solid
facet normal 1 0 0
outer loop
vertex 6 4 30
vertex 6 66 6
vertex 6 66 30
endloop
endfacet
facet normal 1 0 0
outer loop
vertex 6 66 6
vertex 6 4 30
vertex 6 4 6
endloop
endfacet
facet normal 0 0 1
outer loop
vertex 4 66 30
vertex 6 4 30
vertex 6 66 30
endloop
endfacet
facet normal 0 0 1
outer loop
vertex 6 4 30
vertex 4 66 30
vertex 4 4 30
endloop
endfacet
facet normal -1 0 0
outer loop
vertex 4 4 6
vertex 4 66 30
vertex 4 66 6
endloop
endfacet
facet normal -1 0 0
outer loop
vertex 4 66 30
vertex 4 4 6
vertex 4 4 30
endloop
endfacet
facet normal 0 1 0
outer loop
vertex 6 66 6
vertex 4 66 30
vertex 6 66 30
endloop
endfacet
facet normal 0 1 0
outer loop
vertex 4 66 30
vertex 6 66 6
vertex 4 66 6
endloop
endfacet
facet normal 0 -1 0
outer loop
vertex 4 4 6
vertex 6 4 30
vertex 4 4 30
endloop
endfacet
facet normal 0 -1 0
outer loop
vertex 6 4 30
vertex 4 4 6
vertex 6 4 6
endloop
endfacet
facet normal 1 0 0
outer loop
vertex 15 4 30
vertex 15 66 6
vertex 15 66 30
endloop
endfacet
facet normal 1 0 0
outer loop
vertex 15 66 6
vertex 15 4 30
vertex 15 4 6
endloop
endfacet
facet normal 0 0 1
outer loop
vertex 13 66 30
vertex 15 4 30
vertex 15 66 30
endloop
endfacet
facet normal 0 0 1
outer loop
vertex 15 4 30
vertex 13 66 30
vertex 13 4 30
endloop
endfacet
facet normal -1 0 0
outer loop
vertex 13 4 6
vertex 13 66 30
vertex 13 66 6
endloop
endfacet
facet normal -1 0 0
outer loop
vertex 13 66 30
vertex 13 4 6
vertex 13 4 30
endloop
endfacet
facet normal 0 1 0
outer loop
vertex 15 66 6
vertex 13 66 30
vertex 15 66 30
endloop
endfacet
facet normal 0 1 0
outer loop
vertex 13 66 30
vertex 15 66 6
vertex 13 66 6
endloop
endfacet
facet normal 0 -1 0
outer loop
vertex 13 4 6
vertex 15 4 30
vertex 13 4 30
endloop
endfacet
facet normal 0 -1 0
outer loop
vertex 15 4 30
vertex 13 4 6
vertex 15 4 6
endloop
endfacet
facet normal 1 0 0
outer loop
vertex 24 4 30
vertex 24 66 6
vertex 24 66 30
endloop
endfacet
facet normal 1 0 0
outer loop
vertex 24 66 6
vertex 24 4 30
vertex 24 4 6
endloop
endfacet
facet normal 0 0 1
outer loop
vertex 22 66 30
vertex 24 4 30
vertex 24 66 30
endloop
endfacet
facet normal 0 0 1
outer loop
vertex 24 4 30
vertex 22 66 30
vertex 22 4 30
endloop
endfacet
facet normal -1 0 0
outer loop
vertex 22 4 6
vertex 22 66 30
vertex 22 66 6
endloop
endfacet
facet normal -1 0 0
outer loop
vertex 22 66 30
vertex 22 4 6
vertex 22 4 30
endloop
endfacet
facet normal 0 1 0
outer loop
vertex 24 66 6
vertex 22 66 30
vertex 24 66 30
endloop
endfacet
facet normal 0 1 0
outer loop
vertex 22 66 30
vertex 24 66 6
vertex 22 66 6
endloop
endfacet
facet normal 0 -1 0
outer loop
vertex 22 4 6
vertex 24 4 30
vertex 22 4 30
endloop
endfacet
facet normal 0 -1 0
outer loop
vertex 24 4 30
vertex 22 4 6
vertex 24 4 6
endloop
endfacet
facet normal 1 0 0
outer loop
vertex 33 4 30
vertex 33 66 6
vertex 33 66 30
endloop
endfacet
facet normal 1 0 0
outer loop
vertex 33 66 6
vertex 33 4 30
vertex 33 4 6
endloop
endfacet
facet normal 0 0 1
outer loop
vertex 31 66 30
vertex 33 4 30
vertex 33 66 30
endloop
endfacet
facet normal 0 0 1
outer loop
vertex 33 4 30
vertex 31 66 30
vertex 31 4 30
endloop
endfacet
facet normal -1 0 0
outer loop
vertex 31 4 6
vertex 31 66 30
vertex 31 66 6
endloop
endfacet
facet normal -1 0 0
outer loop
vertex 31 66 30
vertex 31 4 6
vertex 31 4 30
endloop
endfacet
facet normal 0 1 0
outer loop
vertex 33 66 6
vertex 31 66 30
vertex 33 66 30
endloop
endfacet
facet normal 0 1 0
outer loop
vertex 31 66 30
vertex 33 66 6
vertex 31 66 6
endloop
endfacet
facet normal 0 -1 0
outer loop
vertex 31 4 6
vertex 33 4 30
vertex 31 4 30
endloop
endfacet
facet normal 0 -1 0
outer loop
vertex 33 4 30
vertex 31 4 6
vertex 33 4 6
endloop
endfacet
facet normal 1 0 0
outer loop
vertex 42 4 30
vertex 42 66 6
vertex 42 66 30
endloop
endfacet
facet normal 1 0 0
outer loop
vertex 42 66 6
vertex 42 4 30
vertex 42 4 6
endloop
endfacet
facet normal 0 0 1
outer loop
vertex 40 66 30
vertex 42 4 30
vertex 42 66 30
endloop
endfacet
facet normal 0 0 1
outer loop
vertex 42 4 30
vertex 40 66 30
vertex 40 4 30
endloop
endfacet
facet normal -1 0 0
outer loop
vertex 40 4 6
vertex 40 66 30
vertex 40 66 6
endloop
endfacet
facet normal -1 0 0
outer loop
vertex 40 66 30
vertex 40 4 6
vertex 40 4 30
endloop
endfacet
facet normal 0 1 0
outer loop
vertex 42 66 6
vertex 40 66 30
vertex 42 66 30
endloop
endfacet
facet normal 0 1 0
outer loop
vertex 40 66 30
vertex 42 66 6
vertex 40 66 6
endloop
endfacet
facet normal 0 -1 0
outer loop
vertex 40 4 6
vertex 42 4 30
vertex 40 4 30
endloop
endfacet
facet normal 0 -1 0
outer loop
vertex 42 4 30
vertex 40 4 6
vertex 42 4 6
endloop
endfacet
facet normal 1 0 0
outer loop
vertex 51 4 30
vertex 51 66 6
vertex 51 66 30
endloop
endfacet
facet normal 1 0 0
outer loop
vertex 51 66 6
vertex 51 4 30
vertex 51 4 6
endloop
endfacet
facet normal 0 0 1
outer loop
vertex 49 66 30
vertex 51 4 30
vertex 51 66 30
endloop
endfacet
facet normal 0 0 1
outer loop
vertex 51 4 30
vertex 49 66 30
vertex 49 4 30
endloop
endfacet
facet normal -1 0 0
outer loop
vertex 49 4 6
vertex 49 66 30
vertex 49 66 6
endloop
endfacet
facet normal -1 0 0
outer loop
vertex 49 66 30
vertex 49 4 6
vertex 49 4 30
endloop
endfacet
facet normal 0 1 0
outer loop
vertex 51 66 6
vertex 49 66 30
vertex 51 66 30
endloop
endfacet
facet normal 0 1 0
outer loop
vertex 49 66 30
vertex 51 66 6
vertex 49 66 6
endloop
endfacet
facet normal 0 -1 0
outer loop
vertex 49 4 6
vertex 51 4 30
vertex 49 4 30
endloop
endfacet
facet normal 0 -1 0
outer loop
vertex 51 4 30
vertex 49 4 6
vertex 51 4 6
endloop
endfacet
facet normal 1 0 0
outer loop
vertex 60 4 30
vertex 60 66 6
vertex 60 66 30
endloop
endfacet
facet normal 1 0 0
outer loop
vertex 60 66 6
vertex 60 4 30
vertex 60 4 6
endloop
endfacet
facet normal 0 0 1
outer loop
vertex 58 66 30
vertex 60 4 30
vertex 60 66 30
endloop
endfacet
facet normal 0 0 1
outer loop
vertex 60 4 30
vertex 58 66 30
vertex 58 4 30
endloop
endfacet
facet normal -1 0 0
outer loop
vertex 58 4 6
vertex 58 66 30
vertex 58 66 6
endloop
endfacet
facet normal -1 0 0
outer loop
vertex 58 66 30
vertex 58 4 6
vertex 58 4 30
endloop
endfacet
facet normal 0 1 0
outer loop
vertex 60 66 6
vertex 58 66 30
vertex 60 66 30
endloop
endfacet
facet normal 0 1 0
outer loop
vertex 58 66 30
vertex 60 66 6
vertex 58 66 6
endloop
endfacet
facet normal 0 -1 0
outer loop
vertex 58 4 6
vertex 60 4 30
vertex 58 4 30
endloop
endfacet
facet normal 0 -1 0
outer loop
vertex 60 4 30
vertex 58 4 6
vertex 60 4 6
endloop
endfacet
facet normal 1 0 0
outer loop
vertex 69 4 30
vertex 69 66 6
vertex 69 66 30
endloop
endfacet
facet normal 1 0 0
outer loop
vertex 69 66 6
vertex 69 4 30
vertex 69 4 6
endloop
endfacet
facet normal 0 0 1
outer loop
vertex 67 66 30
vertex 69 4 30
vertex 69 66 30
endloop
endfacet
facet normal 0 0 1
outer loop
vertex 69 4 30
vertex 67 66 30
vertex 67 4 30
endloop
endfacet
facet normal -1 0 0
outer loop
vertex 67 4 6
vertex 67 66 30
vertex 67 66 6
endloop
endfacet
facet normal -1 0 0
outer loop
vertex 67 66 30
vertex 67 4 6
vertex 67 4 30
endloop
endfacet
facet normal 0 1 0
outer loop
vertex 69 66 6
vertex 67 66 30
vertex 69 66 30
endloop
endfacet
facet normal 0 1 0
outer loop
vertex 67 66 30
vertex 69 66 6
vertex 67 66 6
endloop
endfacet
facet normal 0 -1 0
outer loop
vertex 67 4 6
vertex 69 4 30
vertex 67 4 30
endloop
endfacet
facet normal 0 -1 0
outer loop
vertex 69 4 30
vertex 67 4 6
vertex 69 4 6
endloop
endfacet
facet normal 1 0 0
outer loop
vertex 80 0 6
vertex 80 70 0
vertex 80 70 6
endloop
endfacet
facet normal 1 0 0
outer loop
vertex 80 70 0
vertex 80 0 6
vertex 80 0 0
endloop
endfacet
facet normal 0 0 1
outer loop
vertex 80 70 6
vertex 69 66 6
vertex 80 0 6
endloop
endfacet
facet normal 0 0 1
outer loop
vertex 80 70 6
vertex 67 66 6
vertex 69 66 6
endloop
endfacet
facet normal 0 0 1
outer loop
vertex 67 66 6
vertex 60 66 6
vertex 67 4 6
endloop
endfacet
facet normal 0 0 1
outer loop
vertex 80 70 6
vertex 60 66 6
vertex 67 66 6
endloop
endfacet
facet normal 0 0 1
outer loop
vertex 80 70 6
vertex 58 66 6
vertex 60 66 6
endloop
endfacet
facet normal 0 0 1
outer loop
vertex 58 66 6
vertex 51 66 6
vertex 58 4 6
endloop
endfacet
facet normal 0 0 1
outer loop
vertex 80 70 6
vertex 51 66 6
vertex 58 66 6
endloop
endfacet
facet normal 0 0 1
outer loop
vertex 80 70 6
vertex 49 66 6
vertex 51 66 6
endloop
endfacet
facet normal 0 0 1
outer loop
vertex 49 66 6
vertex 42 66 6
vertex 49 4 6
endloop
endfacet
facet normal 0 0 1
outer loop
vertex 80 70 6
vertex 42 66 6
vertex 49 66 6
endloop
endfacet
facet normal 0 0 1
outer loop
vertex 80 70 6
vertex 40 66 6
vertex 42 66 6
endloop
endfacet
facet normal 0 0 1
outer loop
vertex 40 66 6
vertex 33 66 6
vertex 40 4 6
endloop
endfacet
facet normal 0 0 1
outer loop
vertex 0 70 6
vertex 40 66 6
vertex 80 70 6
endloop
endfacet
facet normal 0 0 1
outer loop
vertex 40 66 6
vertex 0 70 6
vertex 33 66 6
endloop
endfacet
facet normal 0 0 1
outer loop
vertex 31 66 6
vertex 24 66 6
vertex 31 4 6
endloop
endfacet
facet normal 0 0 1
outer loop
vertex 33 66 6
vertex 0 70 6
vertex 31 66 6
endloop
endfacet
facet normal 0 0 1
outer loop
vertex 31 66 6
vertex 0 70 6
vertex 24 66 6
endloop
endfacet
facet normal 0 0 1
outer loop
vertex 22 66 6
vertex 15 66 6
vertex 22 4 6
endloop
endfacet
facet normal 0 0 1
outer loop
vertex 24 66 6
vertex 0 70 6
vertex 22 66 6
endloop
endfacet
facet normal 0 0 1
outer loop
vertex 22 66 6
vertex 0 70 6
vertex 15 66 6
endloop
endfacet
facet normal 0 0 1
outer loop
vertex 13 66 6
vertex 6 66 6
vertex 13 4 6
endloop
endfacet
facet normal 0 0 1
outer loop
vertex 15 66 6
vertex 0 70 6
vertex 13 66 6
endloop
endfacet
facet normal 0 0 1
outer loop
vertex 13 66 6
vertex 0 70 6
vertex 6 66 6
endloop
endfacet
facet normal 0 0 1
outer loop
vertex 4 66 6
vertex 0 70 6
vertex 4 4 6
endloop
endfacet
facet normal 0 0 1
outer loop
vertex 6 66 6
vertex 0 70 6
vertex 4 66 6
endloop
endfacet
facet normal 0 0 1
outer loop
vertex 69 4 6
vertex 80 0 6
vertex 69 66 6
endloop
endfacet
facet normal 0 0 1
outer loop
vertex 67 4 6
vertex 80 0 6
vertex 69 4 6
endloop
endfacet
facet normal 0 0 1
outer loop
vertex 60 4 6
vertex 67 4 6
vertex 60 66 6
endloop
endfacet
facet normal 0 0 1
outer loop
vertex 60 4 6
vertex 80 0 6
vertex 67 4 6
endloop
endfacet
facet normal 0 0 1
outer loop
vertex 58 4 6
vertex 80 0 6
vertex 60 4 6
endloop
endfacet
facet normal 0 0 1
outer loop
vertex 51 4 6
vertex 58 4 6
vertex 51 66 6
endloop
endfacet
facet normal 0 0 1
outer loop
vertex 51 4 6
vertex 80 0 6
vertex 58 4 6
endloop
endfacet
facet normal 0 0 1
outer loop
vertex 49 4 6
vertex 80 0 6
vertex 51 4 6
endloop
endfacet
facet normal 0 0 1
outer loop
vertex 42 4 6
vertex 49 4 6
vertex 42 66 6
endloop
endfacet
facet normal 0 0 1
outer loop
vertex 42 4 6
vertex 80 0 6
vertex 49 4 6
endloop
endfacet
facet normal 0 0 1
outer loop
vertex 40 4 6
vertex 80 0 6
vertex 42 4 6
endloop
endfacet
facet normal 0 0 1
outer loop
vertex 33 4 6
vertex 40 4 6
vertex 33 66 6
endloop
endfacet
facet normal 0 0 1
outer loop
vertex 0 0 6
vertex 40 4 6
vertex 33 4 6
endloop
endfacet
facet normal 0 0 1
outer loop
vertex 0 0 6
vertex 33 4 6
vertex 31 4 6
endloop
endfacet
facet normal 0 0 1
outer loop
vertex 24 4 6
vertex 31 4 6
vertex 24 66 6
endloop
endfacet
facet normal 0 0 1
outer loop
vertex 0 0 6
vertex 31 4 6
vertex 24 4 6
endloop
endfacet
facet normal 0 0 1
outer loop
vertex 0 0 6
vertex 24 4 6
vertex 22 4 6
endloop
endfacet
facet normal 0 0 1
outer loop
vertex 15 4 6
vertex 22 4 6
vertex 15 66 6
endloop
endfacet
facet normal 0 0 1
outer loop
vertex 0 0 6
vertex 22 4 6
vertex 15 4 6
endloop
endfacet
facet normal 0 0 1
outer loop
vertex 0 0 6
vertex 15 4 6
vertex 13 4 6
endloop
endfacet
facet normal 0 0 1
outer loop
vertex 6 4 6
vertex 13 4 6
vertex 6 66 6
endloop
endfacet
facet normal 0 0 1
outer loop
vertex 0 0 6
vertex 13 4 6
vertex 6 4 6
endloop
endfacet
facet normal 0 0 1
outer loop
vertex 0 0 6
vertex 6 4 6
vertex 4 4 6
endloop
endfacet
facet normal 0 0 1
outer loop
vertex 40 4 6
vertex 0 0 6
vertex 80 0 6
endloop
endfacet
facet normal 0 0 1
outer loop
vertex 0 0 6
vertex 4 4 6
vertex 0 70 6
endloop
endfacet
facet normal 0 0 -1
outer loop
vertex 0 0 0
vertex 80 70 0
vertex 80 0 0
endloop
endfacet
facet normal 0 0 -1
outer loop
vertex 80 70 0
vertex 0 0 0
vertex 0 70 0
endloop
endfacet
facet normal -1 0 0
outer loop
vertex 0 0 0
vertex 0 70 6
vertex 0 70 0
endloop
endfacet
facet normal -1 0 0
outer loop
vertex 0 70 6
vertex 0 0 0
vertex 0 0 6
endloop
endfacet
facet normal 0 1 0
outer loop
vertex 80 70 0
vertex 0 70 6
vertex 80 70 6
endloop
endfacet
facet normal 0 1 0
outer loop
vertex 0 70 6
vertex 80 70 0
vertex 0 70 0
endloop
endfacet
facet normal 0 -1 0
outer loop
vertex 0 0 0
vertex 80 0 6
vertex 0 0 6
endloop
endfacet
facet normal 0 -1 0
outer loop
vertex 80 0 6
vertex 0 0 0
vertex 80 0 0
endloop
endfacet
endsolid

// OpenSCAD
$fn = 32;

// ----------------------------------------------------------------------
// Heatsink: uniform fin block
// ----------------------------------------------------------------------

// --- parameters (mm) ---
base_l = 80;              // base length, X
base_w = 70;              // base width, Y
base_t = 6;               // base plate thickness
fin_h = 25;               // fin height above the base
fin_t = 2;                // fin thickness
edge = 4;                 // margin from the base ends
pitch = 9;                // fin pitch

n_fins = floor((base_l - 2 * edge - fin_t) / pitch) + 1;  // fin count
total_h = base_t + fin_h - 1;  // overall height

union() {
  cube([base_l, base_w, base_t]);
  for (i = [0 : n_fins - 1])
    translate([edge + i * pitch, edge, base_t - 1])
      cube([fin_t, base_w - 2 * edge, fin_h]);
}
